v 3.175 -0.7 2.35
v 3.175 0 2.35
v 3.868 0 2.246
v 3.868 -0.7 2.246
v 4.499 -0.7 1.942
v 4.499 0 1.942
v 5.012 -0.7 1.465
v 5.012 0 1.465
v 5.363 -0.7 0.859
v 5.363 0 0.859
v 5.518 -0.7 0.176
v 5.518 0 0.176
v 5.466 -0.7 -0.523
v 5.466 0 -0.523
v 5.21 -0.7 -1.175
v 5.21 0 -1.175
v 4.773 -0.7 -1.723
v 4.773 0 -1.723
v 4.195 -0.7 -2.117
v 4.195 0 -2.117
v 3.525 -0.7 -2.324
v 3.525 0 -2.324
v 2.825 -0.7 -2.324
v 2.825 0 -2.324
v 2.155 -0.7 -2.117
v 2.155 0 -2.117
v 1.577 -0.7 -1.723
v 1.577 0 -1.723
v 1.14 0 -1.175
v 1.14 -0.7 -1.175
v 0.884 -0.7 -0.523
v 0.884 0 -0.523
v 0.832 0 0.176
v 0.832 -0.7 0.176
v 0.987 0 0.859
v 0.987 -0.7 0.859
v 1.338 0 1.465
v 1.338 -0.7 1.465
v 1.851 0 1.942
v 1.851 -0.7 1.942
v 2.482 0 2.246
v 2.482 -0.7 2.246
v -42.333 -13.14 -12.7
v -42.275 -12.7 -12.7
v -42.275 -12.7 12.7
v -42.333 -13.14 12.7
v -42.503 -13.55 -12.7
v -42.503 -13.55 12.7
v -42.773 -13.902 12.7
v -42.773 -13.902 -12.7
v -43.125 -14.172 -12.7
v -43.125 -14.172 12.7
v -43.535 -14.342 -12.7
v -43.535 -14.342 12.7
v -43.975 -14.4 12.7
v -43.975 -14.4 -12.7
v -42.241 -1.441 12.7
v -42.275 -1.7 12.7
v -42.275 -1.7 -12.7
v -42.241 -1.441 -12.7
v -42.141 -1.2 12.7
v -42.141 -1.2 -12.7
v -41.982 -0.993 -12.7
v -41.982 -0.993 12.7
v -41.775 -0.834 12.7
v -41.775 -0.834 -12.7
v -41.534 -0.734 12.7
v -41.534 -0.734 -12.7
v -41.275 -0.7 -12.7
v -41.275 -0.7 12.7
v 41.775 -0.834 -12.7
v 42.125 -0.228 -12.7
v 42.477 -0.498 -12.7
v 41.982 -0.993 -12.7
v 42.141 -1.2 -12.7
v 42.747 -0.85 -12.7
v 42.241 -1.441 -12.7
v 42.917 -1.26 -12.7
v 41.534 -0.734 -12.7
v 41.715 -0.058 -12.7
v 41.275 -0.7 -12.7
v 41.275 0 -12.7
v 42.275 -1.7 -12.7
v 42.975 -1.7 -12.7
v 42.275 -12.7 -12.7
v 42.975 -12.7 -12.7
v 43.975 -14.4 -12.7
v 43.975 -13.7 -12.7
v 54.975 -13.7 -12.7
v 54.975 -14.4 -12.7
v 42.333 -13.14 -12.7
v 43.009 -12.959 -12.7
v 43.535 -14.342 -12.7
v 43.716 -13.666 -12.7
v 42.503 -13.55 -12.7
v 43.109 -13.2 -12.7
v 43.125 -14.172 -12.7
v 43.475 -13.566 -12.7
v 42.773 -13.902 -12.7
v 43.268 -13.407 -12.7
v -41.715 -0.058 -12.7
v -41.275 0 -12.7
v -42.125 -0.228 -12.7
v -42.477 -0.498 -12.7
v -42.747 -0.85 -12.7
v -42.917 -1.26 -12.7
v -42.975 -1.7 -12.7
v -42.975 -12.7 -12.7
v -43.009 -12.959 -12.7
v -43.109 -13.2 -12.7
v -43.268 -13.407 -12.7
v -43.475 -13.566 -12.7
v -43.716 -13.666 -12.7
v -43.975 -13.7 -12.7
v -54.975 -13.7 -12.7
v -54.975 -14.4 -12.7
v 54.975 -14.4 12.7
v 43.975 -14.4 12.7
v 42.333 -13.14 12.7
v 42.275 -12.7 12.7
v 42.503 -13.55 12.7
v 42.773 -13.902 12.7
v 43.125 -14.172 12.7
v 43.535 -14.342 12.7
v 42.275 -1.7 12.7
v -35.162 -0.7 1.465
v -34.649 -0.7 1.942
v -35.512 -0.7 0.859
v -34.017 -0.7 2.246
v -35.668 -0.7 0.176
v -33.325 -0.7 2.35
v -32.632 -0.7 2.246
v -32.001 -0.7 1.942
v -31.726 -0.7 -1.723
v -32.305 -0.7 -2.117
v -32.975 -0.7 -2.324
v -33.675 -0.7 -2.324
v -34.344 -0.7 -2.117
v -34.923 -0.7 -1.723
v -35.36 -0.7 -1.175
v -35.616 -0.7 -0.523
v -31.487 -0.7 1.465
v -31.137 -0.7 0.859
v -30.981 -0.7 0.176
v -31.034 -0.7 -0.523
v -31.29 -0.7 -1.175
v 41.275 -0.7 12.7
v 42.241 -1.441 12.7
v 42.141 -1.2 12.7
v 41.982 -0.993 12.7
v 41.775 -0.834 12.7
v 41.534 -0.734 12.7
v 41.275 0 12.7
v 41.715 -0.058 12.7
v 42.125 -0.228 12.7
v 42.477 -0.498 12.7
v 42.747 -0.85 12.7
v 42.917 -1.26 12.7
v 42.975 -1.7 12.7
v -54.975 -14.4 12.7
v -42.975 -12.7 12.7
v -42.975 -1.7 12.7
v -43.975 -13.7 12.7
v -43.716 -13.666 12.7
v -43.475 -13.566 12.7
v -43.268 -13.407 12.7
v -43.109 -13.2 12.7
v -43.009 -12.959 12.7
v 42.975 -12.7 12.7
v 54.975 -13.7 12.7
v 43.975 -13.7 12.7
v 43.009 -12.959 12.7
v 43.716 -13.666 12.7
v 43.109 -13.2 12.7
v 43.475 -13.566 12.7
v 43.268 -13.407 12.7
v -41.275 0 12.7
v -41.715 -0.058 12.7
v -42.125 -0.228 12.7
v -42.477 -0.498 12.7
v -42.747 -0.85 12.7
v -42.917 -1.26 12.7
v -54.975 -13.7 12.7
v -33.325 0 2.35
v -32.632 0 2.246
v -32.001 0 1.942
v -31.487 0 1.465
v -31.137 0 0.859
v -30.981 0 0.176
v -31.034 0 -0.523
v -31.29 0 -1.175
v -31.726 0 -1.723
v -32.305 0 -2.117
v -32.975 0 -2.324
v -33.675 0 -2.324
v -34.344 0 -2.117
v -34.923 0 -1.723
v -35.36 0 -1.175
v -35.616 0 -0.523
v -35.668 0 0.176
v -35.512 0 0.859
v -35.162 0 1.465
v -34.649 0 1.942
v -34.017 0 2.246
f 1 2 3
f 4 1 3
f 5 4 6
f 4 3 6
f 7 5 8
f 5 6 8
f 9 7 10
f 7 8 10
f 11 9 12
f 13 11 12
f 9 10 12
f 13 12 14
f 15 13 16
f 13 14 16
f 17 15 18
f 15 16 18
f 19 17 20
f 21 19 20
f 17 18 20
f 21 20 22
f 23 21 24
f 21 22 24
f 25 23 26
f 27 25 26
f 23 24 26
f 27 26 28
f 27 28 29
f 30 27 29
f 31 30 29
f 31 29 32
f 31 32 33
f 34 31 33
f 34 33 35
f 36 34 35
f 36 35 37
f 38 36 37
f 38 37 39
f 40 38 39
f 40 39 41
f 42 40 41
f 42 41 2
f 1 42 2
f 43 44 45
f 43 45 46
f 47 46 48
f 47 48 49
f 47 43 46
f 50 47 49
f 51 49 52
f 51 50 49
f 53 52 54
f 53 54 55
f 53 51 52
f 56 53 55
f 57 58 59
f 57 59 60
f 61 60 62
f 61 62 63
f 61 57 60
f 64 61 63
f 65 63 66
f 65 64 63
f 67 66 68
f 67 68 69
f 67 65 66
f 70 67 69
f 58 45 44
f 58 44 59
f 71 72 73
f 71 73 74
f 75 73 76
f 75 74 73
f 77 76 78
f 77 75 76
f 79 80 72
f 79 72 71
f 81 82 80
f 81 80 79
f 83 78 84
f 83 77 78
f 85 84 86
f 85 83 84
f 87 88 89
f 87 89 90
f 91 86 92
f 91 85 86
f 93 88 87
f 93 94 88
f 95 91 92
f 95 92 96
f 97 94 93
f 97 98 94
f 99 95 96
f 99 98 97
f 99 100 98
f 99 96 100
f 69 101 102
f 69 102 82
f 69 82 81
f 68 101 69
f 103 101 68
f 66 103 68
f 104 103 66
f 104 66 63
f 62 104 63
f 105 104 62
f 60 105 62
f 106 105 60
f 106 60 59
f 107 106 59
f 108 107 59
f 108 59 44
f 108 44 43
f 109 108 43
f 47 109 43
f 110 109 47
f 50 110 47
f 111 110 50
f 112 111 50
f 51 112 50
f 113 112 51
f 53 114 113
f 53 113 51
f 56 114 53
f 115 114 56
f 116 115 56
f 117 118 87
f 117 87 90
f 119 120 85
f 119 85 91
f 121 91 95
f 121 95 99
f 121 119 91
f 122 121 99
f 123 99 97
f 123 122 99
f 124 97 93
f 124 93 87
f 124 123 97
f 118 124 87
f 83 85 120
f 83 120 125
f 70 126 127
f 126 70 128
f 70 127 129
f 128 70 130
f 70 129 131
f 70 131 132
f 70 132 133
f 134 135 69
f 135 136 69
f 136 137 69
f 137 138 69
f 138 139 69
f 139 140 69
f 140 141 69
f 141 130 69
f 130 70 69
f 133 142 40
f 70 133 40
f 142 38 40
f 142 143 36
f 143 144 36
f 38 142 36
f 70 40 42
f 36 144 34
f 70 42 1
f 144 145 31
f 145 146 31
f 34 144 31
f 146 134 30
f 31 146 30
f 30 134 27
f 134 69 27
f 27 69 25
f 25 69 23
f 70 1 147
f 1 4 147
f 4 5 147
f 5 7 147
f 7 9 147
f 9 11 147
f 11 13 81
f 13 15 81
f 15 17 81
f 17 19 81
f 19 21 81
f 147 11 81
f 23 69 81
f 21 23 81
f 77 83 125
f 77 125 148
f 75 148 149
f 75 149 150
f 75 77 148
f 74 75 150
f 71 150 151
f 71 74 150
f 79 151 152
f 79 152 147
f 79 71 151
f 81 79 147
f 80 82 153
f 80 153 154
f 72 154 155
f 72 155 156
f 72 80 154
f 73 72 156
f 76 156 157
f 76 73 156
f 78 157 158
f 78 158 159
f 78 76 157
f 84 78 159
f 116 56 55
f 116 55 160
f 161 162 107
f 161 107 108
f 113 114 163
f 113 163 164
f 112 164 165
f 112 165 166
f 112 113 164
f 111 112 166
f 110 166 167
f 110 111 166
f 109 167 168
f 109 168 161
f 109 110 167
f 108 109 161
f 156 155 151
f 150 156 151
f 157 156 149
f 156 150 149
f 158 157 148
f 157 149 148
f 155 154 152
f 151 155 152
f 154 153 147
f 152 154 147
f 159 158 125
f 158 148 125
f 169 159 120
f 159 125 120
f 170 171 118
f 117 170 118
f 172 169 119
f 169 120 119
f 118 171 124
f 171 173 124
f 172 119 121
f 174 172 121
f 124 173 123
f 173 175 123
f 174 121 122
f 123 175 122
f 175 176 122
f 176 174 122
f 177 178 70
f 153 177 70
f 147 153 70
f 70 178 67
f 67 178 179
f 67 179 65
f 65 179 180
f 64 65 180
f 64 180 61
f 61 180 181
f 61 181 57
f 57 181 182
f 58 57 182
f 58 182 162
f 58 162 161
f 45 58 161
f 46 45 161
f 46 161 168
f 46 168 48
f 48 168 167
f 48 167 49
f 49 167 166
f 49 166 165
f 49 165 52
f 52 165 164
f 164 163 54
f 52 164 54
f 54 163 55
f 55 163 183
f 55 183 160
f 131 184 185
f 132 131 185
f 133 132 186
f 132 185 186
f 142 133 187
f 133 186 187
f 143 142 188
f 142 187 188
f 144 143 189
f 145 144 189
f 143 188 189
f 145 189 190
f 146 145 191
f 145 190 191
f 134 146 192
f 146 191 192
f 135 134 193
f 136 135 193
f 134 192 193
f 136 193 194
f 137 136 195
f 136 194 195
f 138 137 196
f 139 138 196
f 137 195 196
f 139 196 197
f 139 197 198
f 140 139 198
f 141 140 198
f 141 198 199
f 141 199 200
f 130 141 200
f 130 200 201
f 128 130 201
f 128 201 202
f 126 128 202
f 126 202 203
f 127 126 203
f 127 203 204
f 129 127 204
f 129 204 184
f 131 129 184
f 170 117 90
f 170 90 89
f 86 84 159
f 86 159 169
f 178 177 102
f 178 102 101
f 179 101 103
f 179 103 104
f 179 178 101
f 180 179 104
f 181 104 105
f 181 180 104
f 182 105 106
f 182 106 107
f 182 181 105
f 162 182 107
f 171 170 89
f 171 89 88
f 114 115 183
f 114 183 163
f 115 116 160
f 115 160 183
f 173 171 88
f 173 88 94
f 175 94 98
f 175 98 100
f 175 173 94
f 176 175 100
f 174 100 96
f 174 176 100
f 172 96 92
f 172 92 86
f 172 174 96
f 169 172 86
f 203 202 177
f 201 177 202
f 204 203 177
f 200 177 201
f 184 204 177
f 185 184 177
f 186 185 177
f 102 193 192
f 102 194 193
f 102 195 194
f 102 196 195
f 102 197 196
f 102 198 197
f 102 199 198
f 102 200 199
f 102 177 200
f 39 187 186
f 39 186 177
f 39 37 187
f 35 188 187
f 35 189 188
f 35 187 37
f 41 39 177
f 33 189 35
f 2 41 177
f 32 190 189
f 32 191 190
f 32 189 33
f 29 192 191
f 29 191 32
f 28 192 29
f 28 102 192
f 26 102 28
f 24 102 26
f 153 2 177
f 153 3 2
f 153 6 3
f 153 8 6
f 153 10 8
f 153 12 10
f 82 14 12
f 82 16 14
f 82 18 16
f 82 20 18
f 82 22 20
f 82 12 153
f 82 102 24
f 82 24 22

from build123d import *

# Parameters (mm, degrees)
SKETCH1_W          = 82.55
SKETCH1_H          = 25.4
BASE_FLANGE1_DEPTH = 0.7
EDGE_FLANGE1_DEPTH = 25.4
EDGE_FLANGE2_DEPTH = 25.4
EDGE_FLANGE3_DEPTH = 25.4
EDGE_FLANGE4_DEPTH = 25.4
SKETCH19_R         = 2.35
CUT_EXTRUDE1_DEPTH = 59.231440176


# Sheet-metal steps are written as plain solids
with BuildPart() as part:
    # Sketch1 → Base-Flange1 (new body)
    with BuildSketch(Plane(origin=(0, 0, 0), x_dir=(1, 0, 0), z_dir=(0, 1, 0))):
        Rectangle(SKETCH1_W, SKETCH1_H)
    extrude(amount=-BASE_FLANGE1_DEPTH)

    # Edge-Flange1 section (across the edge) → Edge-Flange1 (add)
    with BuildSketch(Plane(origin=(42.275, -0.7, -12.7), x_dir=(-1, 0, 0), z_dir=(0, 0, 1))):
        with BuildLine():
            Line((-0.7, 1), (-0.7, 12))
            Line((-0.7, 12), (0, 12))
            Line((0, 12), (0, 1))
            ThreePointArc((0, 1), (0.292893219, 0.292893219), (1, 0))
            Line((1, 0), (1, -0.7))
            ThreePointArc((1, -0.7), (-0.202081528, -0.202081528), (-0.7, 1))
        make_face()
    extrude(amount=EDGE_FLANGE1_DEPTH)

    # Edge-Flange2 section (across the edge) → Edge-Flange2 (add)
    with BuildSketch(Plane(origin=(42.975, -13.7, 12.7), x_dir=(0, 1, 0), z_dir=(0, 0, -1))):
        with BuildLine():
            Line((-0.7, 1), (-0.7, 12))
            Line((-0.7, 12), (0, 12))
            Line((0, 12), (0, 1))
            ThreePointArc((0, 1), (0.292893219, 0.292893219), (1, 0))
            Line((1, 0), (1, -0.7))
            ThreePointArc((1, -0.7), (-0.202081528, -0.202081528), (-0.7, 1))
        make_face()
    extrude(amount=EDGE_FLANGE2_DEPTH)

    # Edge-Flange3 section (across the edge) → Edge-Flange3 (add)
    with BuildSketch(Plane(origin=(-42.275, -0.7, 12.7), x_dir=(1, 0, 0), z_dir=(0, 0, -1))):
        with BuildLine():
            Line((-0.7, 1), (-0.7, 12))
            Line((-0.7, 12), (0, 12))
            Line((0, 12), (0, 1))
            ThreePointArc((0, 1), (0.292893219, 0.292893219), (1, 0))
            Line((1, 0), (1, -0.7))
            ThreePointArc((1, -0.7), (-0.202081528, -0.202081528), (-0.7, 1))
        make_face()
    extrude(amount=EDGE_FLANGE3_DEPTH)

    # Edge-Flange4 section (across the edge) → Edge-Flange4 (add)
    with BuildSketch(Plane(origin=(-42.975, -13.7, -12.7), x_dir=(0, 1, 0), z_dir=(0, 0, 1))):
        with BuildLine():
            Line((-0.7, 1), (-0.7, 12))
            Line((-0.7, 12), (0, 12))
            Line((0, 12), (0, 1))
            ThreePointArc((0, 1), (0.292893219, 0.292893219), (1, 0))
            Line((1, 0), (1, -0.7))
            ThreePointArc((1, -0.7), (-0.202081528, -0.202081528), (-0.7, 1))
        make_face()
    extrude(amount=EDGE_FLANGE4_DEPTH)

    # Sketch19 → Cut-Extrude1 (cut, through all)
    with BuildSketch(Plane(origin=(0, 0, 0), x_dir=(1, 0, 0), z_dir=(0, 1, 0))):
        with Locations(Location((-33.3248, 0, 0), (0, 0, 270))):
            Circle(SKETCH19_R)
        with Locations(Location((3.175, 0, 0), (0, 0, 270))):
            Circle(SKETCH19_R)
    extrude(amount=-CUT_EXTRUDE1_DEPTH, mode=Mode.SUBTRACT)


solid = part.part
